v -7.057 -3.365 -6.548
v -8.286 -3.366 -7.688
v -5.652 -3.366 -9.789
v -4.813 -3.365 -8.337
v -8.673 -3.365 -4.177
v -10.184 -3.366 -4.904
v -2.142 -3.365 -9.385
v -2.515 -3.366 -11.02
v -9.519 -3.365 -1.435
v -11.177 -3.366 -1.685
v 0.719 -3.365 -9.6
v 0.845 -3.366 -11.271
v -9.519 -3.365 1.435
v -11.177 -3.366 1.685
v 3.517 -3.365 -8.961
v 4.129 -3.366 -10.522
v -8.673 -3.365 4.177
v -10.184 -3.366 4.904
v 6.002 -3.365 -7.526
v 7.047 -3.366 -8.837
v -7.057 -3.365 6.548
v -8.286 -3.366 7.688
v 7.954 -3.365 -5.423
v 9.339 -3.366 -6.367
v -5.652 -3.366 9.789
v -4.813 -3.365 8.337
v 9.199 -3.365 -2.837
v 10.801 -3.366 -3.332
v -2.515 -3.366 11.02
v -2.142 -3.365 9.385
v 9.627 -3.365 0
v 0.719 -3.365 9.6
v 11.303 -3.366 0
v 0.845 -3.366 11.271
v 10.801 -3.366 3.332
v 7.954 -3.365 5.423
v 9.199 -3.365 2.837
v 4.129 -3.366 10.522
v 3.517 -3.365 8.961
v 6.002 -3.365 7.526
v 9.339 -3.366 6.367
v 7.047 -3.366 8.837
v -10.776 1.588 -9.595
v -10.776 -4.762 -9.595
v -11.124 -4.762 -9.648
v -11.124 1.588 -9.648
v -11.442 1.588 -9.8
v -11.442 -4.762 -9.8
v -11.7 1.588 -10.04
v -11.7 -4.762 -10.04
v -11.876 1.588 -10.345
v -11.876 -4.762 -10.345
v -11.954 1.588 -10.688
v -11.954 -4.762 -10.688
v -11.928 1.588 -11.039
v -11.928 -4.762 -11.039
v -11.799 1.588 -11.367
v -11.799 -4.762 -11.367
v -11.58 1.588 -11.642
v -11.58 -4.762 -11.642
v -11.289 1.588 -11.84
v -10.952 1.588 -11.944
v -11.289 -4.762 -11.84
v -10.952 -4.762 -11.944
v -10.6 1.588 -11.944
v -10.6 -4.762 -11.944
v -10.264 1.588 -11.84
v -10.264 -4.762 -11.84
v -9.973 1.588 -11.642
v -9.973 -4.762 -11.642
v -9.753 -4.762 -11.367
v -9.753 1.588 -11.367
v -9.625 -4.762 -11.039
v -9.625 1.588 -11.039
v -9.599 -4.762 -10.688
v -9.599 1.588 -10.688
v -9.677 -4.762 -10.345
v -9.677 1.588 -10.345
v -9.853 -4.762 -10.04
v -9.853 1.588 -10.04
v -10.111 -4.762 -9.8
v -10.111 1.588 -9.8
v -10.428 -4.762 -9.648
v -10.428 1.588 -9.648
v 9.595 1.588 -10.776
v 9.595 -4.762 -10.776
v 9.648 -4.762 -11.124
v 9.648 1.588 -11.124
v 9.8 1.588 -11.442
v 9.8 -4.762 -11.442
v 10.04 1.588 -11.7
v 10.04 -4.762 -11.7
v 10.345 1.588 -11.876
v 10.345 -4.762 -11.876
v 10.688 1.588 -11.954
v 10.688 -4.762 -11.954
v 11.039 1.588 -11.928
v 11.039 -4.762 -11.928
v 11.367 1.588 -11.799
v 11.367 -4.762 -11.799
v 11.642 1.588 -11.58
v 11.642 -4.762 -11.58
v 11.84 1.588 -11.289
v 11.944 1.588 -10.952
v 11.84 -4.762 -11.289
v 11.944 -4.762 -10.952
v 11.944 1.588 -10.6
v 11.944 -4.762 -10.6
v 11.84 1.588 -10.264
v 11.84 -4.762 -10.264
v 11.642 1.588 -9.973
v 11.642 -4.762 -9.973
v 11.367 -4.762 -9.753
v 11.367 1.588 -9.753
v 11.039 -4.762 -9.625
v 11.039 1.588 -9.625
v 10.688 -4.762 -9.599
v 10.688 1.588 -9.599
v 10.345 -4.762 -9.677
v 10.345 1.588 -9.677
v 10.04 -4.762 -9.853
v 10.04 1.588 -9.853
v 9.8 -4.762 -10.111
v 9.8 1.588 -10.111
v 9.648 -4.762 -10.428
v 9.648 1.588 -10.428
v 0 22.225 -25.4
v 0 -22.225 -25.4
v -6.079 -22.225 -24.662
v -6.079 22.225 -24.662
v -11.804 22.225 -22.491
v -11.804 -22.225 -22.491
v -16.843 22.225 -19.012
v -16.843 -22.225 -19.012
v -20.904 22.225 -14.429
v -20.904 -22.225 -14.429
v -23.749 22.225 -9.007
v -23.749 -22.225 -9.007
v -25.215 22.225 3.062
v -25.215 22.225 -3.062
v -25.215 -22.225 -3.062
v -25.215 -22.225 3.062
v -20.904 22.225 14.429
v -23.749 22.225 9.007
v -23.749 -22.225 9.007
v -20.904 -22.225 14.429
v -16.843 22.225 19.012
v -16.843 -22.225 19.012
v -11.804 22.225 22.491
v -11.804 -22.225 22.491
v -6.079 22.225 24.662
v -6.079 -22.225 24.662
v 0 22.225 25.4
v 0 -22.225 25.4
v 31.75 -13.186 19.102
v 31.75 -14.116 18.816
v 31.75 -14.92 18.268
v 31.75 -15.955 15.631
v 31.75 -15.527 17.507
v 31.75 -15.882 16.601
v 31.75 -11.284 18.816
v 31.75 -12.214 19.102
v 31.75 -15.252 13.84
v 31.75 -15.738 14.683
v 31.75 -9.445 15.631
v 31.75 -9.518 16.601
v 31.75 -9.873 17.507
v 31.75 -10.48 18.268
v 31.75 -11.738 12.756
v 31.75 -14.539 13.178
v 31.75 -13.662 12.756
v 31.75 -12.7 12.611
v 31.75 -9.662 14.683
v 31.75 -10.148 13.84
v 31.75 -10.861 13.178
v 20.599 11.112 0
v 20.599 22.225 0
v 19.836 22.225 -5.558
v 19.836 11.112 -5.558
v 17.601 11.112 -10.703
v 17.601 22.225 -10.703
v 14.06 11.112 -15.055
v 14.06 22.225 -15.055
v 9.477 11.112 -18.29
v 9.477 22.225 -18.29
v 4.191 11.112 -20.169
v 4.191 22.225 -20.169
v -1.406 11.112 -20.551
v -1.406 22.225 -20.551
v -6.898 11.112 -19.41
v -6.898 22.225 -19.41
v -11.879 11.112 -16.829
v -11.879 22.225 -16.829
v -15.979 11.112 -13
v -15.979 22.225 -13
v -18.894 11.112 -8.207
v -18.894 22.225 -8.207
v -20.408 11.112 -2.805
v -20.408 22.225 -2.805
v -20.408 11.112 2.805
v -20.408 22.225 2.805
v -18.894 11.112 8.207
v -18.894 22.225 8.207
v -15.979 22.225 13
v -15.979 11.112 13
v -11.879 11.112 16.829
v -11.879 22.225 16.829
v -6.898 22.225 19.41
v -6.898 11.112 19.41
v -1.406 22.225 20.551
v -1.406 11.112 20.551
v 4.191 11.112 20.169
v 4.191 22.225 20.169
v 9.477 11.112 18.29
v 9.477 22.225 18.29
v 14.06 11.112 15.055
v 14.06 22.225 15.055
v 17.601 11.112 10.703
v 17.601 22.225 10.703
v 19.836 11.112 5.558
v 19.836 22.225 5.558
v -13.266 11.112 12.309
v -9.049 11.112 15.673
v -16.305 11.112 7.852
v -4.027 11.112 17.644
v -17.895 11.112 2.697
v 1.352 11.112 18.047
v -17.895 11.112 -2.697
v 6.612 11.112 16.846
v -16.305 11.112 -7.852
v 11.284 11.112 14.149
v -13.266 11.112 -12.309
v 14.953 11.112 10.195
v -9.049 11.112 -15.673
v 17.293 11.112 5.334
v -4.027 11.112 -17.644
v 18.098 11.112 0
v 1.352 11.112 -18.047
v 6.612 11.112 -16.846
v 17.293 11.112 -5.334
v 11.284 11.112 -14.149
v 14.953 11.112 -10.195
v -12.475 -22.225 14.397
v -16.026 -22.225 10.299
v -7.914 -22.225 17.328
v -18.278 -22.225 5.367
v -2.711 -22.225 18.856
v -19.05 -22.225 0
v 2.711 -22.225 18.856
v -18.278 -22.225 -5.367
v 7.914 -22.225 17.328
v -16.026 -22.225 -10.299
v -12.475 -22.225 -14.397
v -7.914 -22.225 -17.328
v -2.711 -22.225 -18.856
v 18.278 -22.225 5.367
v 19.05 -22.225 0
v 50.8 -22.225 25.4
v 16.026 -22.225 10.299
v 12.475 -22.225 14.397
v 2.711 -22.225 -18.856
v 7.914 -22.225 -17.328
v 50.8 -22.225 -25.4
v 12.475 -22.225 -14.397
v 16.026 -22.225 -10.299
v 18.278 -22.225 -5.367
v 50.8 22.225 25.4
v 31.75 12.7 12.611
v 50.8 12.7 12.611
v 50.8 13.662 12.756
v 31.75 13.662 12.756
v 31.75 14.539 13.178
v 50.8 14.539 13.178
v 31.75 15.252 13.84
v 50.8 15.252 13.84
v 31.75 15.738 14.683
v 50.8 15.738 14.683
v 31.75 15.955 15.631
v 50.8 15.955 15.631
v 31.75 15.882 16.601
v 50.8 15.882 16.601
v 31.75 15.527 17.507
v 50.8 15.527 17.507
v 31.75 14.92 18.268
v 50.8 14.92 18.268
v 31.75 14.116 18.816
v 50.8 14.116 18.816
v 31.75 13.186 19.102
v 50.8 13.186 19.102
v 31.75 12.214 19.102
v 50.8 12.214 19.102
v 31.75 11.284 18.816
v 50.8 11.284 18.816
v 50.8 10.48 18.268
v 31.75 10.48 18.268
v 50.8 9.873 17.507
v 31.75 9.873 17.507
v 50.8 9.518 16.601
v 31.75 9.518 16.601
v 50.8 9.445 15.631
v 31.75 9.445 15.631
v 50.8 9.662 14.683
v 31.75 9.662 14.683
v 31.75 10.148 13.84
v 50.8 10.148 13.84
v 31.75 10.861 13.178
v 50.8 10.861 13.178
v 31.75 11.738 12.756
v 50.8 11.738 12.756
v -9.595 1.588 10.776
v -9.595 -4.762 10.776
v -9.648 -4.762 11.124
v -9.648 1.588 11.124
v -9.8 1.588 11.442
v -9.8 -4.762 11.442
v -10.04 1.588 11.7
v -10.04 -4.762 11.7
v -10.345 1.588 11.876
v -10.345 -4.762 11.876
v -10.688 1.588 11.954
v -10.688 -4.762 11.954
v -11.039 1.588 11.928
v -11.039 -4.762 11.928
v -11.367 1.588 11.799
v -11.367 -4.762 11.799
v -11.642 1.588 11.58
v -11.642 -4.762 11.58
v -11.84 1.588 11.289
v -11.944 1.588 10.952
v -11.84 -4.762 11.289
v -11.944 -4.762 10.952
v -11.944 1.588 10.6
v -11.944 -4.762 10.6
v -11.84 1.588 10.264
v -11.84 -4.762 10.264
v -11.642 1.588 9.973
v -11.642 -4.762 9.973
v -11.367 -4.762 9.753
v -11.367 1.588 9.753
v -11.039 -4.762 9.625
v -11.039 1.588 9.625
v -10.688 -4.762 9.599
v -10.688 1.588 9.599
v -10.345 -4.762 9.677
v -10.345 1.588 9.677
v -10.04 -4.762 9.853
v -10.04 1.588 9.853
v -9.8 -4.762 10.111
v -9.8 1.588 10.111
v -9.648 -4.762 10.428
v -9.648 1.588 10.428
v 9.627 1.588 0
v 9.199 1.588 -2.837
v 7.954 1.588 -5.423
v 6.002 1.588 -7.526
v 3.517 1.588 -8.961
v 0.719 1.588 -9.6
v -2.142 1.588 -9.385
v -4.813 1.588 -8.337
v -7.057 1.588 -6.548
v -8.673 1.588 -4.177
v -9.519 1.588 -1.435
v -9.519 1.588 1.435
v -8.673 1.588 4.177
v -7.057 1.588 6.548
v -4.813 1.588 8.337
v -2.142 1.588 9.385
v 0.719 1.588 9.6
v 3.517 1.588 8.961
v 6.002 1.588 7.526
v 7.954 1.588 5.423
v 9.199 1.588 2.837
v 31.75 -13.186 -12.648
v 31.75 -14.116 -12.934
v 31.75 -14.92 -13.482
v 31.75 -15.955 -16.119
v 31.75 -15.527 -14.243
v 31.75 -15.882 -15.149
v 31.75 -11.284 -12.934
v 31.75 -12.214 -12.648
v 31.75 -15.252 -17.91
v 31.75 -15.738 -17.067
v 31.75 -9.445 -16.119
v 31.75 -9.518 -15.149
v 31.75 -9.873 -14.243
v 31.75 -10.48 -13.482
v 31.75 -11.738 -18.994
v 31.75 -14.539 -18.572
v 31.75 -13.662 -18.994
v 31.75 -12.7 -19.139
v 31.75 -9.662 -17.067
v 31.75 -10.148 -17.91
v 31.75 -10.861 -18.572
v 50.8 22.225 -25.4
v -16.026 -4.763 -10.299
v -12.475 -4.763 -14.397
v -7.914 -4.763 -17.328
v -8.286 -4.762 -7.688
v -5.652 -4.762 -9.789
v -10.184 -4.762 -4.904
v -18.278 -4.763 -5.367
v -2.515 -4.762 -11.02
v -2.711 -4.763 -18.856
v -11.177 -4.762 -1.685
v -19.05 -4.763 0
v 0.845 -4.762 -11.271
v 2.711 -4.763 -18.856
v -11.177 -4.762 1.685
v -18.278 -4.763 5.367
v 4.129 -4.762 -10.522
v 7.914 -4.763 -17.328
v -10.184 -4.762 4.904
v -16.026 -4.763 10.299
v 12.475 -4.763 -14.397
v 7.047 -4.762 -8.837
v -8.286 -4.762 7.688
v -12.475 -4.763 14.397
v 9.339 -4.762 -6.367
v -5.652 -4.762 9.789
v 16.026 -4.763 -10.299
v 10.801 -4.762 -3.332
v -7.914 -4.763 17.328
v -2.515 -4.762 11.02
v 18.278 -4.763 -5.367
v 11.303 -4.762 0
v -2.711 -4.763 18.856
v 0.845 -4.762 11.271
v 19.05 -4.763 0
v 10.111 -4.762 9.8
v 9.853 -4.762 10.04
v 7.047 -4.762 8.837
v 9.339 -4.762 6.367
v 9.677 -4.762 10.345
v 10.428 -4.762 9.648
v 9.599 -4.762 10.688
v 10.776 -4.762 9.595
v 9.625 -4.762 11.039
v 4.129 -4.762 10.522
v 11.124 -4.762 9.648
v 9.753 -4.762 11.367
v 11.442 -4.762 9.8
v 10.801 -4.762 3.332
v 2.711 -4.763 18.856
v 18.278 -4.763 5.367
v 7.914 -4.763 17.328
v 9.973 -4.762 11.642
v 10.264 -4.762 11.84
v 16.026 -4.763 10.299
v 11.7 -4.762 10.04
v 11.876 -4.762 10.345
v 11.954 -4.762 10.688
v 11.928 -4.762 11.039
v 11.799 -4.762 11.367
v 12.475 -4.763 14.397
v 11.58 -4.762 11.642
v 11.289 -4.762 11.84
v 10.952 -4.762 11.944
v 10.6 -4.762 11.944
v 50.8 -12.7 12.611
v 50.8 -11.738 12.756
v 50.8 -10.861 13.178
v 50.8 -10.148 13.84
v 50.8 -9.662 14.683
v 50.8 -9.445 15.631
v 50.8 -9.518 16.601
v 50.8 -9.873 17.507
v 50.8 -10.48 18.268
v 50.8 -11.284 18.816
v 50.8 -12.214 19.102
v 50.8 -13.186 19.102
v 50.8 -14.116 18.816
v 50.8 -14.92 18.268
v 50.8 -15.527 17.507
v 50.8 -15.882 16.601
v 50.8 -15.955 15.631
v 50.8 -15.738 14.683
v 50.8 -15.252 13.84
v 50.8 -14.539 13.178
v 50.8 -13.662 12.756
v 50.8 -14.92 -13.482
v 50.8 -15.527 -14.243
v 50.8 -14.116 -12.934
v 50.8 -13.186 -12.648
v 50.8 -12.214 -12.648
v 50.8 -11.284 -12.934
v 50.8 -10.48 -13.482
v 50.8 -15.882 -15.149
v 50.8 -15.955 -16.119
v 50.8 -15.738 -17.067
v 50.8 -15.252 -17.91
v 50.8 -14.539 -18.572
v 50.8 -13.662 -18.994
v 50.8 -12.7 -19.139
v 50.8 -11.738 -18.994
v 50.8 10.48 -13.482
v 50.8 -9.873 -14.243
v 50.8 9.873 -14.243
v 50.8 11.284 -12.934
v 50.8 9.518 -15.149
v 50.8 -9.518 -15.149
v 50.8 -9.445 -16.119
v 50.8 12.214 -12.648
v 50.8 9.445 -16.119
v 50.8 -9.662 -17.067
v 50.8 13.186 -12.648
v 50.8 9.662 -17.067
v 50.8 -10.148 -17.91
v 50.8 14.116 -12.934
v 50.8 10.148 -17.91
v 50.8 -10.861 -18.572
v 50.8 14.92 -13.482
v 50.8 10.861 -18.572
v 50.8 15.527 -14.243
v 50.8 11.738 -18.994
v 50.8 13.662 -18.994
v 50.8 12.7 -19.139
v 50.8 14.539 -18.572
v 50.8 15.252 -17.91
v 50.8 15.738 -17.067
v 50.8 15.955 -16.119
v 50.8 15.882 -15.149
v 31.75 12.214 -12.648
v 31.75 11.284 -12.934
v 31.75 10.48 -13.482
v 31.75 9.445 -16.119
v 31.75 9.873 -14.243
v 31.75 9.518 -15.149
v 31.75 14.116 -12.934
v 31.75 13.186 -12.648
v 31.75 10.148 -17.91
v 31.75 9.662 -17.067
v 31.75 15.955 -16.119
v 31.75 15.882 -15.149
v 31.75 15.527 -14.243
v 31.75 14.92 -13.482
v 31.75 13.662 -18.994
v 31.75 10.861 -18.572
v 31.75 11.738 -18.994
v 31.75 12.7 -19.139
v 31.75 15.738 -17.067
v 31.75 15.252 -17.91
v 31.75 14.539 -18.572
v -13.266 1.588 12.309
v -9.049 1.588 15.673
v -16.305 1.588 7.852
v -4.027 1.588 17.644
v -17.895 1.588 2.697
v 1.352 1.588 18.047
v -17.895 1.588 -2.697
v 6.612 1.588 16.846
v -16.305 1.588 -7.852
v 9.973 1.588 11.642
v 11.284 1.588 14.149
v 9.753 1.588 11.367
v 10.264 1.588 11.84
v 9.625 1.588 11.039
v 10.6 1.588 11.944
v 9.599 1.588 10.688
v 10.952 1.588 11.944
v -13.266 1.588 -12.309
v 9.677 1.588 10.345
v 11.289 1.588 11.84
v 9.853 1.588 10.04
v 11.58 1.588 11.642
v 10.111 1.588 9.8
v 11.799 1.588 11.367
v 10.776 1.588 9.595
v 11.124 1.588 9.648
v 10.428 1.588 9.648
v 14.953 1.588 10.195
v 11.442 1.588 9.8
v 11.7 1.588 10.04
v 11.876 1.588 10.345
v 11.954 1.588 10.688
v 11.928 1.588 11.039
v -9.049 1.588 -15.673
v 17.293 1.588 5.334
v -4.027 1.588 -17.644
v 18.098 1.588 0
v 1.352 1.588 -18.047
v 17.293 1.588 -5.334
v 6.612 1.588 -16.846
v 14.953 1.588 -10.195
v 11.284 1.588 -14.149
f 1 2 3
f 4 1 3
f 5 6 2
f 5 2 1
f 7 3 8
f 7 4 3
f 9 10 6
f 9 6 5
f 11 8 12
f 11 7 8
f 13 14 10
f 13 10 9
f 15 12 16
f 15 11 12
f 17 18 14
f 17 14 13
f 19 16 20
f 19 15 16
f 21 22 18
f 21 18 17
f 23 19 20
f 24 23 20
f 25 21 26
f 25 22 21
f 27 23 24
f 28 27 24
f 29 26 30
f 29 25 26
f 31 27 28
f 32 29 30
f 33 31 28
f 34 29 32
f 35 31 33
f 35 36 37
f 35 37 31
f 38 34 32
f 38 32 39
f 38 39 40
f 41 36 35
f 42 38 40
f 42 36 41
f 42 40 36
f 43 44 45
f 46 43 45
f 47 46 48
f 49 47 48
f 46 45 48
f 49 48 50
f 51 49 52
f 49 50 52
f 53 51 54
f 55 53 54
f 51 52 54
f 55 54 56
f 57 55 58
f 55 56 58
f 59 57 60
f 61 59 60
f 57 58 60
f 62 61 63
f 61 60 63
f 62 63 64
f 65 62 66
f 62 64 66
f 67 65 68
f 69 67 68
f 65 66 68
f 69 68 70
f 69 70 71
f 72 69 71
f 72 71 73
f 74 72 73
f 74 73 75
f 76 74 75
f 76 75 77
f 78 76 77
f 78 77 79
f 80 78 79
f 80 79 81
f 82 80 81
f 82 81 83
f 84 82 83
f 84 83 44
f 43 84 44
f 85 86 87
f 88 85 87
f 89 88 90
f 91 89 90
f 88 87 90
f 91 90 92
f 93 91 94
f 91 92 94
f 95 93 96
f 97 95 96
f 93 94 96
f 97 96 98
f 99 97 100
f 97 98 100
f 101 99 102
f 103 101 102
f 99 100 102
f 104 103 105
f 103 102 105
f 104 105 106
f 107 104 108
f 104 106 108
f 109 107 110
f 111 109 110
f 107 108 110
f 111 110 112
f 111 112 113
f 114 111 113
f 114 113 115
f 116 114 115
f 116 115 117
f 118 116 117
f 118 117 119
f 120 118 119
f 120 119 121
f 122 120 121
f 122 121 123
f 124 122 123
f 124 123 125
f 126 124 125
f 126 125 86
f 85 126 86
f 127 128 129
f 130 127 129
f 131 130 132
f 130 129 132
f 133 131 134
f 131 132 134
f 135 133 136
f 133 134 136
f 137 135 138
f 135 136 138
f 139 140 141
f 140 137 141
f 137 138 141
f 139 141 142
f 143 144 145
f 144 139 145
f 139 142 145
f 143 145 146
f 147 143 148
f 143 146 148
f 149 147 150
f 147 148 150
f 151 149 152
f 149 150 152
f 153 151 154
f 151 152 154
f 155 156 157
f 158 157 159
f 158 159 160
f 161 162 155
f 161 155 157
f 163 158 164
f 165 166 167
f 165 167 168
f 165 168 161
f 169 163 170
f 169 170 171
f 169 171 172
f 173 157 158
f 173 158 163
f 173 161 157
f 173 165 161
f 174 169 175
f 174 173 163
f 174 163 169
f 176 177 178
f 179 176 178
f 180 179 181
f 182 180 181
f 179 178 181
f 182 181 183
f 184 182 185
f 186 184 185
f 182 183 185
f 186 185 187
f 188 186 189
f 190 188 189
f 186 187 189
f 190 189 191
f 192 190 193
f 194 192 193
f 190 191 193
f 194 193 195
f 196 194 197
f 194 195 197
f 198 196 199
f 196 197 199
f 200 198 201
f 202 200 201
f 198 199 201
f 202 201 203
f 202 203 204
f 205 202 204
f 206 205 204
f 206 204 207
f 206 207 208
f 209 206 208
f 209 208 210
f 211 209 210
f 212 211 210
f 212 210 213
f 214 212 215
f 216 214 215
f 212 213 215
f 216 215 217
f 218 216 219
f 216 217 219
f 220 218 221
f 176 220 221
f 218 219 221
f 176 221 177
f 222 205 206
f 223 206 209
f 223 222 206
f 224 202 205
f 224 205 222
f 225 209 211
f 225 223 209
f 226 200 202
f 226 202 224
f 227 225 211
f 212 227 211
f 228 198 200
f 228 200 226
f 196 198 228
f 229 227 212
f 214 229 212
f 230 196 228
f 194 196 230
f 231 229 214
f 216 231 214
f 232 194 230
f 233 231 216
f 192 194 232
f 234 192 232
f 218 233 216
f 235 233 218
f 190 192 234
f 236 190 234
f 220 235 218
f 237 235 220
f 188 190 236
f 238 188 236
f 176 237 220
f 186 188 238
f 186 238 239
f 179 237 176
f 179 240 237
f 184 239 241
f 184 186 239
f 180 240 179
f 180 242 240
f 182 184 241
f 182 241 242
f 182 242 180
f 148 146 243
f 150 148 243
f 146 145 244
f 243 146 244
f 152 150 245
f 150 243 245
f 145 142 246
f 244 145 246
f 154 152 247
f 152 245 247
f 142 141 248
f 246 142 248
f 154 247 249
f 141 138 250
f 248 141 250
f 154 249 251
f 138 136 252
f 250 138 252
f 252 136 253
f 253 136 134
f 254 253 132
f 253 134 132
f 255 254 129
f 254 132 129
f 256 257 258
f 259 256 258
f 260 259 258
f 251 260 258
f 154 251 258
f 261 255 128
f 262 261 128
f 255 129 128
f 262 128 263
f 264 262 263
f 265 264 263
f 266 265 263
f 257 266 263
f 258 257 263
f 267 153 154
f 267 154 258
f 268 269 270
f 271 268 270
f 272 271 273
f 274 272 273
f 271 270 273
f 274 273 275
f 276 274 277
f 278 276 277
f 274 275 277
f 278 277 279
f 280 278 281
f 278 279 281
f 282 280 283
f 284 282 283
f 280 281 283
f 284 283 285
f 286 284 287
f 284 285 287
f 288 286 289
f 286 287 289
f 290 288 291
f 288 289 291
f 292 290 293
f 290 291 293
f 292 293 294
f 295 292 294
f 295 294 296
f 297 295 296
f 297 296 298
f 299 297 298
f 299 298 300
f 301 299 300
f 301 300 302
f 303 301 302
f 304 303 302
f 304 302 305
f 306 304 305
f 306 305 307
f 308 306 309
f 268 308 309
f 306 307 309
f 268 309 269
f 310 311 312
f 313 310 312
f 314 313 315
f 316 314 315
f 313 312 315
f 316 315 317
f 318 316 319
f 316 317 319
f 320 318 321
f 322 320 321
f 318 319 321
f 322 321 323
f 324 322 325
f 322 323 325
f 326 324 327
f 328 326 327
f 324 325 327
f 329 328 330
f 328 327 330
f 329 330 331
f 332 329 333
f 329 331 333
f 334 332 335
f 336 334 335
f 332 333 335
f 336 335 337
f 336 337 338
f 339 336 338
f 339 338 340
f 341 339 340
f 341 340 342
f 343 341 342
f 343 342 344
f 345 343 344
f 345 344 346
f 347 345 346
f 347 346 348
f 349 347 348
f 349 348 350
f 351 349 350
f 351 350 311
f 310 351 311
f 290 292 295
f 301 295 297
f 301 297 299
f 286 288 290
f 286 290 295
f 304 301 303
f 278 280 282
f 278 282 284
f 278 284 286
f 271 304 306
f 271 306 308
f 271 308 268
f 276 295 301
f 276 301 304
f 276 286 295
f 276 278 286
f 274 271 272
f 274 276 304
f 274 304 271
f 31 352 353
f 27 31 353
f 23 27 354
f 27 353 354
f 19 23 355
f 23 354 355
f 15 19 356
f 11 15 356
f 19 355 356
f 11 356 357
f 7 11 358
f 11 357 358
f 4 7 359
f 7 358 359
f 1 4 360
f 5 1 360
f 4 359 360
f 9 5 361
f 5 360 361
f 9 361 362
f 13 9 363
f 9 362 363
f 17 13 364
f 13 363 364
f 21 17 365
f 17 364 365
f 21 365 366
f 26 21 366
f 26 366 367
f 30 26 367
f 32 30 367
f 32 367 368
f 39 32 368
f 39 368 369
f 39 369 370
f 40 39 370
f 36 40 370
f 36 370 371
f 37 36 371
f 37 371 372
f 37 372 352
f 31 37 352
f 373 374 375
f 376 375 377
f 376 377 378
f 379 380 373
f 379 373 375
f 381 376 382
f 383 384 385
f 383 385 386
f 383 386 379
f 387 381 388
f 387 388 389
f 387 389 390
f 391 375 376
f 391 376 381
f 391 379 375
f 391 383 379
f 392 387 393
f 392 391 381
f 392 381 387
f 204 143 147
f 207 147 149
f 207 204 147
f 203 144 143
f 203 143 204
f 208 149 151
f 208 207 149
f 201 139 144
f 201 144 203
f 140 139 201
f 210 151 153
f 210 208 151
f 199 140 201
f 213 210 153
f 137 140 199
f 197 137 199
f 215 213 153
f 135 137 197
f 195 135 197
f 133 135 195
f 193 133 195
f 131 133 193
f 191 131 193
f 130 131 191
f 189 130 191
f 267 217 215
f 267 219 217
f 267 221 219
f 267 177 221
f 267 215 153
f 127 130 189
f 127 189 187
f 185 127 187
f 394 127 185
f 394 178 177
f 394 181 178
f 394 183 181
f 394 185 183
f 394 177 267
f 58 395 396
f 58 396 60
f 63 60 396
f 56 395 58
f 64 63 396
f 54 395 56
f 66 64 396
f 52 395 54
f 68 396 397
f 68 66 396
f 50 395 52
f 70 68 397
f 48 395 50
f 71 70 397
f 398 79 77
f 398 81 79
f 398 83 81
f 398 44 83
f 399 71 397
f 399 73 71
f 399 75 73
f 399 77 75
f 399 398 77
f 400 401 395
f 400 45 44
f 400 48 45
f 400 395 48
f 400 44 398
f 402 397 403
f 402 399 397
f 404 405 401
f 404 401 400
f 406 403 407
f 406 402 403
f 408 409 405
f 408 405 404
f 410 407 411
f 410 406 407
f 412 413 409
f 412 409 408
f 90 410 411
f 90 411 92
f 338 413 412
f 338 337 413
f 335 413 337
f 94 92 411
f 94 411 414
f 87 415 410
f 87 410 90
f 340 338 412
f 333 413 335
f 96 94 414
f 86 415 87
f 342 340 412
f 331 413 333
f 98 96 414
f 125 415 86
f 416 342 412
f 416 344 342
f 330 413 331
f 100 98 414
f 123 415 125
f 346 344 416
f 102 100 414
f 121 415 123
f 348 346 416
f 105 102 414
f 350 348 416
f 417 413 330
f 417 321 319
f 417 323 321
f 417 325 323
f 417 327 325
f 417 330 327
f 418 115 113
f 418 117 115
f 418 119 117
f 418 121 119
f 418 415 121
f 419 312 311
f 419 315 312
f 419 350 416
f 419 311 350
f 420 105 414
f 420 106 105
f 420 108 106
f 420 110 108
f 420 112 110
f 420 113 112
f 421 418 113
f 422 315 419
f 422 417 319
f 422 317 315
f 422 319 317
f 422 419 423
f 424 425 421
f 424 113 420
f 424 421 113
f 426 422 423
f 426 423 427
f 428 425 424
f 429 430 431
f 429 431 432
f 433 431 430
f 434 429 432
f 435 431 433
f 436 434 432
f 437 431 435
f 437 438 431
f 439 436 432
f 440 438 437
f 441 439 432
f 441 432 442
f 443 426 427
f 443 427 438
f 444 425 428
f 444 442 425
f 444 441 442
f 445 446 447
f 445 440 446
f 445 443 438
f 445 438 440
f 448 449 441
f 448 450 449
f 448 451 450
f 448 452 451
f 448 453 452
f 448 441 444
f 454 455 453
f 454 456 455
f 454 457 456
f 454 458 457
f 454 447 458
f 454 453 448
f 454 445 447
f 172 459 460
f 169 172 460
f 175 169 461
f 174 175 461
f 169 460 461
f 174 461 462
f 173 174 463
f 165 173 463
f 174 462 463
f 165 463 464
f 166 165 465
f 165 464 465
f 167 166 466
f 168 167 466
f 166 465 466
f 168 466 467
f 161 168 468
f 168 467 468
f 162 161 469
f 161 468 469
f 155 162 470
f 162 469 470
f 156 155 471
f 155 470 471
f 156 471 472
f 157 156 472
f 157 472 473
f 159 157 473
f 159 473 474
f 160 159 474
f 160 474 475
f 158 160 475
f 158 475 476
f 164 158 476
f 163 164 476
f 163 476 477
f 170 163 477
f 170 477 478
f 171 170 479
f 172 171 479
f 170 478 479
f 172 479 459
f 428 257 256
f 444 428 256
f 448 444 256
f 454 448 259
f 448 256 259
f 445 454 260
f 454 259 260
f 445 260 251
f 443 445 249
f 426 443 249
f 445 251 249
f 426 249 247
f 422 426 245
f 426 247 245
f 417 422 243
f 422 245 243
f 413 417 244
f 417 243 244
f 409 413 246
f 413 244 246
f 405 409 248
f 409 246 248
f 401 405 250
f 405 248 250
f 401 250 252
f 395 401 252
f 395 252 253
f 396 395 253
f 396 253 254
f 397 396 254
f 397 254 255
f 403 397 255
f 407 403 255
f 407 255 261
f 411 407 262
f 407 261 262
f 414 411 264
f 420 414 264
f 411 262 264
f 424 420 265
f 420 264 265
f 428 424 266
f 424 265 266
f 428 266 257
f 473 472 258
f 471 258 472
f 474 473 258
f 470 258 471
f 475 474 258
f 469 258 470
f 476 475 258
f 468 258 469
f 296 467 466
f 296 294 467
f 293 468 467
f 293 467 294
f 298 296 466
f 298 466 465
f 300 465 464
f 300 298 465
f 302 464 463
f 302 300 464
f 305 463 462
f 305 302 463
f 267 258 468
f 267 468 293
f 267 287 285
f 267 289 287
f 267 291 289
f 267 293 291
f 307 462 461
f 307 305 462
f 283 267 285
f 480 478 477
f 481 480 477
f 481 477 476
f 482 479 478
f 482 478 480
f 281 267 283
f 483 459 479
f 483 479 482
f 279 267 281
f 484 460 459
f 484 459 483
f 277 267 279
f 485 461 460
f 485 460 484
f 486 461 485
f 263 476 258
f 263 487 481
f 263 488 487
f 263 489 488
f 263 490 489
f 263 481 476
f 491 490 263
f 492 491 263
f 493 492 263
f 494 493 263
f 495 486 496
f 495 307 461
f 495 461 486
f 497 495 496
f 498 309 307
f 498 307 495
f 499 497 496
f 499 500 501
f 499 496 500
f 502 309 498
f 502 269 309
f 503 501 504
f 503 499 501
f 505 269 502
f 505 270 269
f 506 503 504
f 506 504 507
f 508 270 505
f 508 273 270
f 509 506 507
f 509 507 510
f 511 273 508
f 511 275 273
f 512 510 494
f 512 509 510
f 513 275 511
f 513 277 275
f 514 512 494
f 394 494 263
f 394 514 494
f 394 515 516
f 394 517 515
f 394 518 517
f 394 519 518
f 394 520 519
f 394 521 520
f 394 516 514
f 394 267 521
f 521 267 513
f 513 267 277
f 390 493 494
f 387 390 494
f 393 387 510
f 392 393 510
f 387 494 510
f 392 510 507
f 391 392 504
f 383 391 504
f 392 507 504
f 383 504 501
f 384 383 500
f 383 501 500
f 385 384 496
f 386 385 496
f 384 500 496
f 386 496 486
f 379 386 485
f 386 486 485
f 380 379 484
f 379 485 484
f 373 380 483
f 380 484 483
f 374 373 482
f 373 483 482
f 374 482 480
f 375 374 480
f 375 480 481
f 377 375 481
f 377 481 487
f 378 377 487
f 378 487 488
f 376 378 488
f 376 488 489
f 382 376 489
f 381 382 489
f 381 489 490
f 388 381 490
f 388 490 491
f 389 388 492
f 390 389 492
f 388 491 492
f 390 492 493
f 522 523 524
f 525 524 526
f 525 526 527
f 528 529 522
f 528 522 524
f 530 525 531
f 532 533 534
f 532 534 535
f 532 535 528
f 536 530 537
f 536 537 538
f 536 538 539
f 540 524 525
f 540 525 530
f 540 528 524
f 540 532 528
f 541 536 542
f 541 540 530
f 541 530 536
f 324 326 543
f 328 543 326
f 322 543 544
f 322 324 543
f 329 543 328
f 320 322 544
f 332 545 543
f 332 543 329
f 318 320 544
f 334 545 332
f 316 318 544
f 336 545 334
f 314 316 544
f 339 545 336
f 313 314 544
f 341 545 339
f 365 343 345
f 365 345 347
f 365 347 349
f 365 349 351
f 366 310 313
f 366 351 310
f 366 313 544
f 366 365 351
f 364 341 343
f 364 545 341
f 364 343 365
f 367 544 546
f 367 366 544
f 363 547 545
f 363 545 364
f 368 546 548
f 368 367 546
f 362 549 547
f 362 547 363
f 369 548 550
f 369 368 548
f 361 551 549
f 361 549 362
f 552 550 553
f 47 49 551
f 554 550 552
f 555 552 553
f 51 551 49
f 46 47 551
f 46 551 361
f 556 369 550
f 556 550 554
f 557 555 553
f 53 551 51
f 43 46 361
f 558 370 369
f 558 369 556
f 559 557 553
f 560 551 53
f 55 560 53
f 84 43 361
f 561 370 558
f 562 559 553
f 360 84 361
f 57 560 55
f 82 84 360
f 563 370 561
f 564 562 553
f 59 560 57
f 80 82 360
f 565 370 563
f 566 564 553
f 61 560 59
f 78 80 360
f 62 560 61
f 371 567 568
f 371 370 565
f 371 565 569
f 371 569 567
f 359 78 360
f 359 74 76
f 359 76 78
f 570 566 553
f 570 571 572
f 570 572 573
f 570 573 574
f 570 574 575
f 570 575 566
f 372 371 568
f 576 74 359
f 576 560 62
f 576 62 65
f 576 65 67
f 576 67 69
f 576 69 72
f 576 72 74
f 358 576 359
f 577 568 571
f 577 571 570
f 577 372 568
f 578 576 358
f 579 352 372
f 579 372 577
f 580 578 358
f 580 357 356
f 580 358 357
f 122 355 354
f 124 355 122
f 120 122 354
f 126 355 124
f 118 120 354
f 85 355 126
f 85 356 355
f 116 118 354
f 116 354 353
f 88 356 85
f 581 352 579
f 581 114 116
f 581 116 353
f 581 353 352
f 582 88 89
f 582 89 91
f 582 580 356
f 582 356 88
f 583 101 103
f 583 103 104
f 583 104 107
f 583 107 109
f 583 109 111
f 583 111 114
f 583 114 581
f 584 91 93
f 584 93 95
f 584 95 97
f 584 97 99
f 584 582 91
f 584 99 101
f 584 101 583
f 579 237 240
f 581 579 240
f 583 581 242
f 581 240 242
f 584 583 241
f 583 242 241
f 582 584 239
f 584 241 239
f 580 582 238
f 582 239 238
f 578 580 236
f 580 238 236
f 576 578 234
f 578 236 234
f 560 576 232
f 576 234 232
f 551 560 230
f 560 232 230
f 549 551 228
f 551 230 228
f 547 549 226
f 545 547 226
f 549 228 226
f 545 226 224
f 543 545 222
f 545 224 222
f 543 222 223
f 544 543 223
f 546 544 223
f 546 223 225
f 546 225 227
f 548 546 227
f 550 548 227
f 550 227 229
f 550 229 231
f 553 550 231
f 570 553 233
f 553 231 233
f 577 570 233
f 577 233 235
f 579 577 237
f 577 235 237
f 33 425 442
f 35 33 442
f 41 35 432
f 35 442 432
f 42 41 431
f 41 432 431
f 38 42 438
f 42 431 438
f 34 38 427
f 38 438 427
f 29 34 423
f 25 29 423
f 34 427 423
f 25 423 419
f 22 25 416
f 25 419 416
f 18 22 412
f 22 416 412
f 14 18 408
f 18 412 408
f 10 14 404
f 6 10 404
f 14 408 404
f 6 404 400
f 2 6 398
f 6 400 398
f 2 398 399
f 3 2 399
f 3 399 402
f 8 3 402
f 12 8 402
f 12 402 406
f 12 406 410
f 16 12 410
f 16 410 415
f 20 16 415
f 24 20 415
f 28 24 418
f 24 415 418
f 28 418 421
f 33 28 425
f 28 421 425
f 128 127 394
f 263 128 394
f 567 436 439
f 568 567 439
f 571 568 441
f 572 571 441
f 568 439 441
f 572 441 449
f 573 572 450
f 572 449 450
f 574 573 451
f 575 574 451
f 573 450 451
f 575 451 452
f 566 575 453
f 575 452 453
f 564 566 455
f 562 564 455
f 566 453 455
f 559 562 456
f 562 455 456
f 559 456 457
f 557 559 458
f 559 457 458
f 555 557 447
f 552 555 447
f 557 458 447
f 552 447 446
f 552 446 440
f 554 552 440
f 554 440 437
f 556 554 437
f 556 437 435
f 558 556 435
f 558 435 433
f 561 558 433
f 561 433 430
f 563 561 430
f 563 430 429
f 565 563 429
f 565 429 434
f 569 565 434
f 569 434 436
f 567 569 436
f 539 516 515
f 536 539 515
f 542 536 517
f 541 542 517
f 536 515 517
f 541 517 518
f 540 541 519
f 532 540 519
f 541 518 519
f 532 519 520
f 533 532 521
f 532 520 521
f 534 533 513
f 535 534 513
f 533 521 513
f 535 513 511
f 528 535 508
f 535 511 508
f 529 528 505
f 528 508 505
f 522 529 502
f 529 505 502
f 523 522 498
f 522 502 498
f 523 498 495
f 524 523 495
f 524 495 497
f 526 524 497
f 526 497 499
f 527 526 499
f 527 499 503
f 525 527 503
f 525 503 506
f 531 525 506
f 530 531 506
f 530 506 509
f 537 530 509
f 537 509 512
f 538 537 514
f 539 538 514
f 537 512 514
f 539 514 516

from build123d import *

# Parameters (mm, degrees)
SKETCH1_W           = 76.2
SKETCH1_H           = 50.8
BOSS_EXTRUDE1_DEPTH = 22.225
SKETCH2_R           = 20.5994
CUT_EXTRUDE1_DEPTH  = 11.1125
SKETCH3_R           = 18.0975
CUT_EXTRUDE2_DEPTH  = 9.525
SKETCH4_R           = 9.6266
CUT_EXTRUDE3_DEPTH  = 24.8125
SKETCH5_R           = 19.05
CUT_EXTRUDE4_DEPTH  = 17.4625
SKETCH6_R           = 11.303
CUT_EXTRUDE5_DEPTH  = 1.397
SKETCH7_R           = 3.2639
CUT_EXTRUDE6_DEPTH  = 19.05
SKETCH8_R           = 1.1811
CUT_EXTRUDE7_DEPTH  = 27.9875
CIRPATTERN1_COUNT   = 4
CUT_EXTRUDE8_DEPTH  = 45.45


with BuildPart() as part:
    # Sketch1 → Boss-Extrude1 (new body, symmetric)
    with BuildSketch(Plane(origin=(0, 0, 0), x_dir=(1, 0, 0), z_dir=(0, 1, 0))):
        with Locations((12.7, 0)):
            Rectangle(SKETCH1_W, SKETCH1_H)
    extrude(amount=BOSS_EXTRUDE1_DEPTH, both=True)

    # Sketch2 → Cut-Extrude1 (cut)
    with BuildSketch(Plane(origin=(0, 22.225, 0), x_dir=(1, 0, 0), z_dir=(0, 1, 0))):
        Circle(SKETCH2_R)
    extrude(amount=-CUT_EXTRUDE1_DEPTH, mode=Mode.SUBTRACT)

    # Sketch3 → Cut-Extrude2 (cut)
    with BuildSketch(Plane(origin=(0, 11.1125, 0), x_dir=(1, 0, 0), z_dir=(0, 1, 0))):
        Circle(SKETCH3_R)
    extrude(amount=-CUT_EXTRUDE2_DEPTH, mode=Mode.SUBTRACT)

    # Sketch4 → Cut-Extrude3 (cut, through all)
    with BuildSketch(Plane(origin=(0, 1.5875, 0), x_dir=(1, 0, 0), z_dir=(0, 1, 0))):
        Circle(SKETCH4_R)
    extrude(amount=-CUT_EXTRUDE3_DEPTH, mode=Mode.SUBTRACT)

    # Sketch5 → Cut-Extrude4 (cut)
    with BuildSketch(Plane.XZ.offset(22.225)):
        Circle(SKETCH5_R)
    extrude(amount=-CUT_EXTRUDE4_DEPTH, mode=Mode.SUBTRACT)

    # Sketch6 → Cut-Extrude5 (cut)
    with BuildSketch(Plane.XZ.offset(4.7625)):
        Circle(SKETCH6_R)
    extrude(amount=-CUT_EXTRUDE5_DEPTH, mode=Mode.SUBTRACT)

    # Sketch7 → Cut-Extrude6 (cut)
    with BuildSketch(Plane(origin=(50.8, 0, 0), x_dir=(0, 0, -1), z_dir=(1, 0, 0))):
        with Locations((-15.875, 12.7)):
            Circle(SKETCH7_R)
        with Locations((15.875, 12.7)):
            Circle(SKETCH7_R)
        with Locations((-15.875, -12.7)):
            Circle(SKETCH7_R)
        with Locations((15.875, -12.7)):
            Circle(SKETCH7_R)
    extrude(amount=-CUT_EXTRUDE6_DEPTH, mode=Mode.SUBTRACT)

    # Sketch8 → Cut-Extrude7 (cut, through all)
    with BuildSketch(Plane.XZ.offset(4.7625)):
        with Locations((-10.776307345, 10.776307345)):
            Circle(SKETCH8_R)
    cut_extrude7 = extrude(amount=-CUT_EXTRUDE7_DEPTH, mode=Mode.SUBTRACT)

    # CirPattern1: Cut-Extrude7 ×4 about axis
    cirpattern1_axis = Axis((0, 0, 0), (0, 1, 0))
    for i in range(1, CIRPATTERN1_COUNT):
        add(cut_extrude7.rotate(cirpattern1_axis, i * 360 / CIRPATTERN1_COUNT), mode=Mode.SUBTRACT)

    # Sketch9 → Cut-Extrude8 (cut, through all)
    with BuildSketch(Plane.XZ.offset(22.225)):
        with BuildLine():
            Line((0, 25.4), (0, 38.1))
            Line((0, 38.1), (-38.1, 38.1))
            Line((-38.1, 38.1), (-38.1, -38.1))
            Line((-38.1, -38.1), (0, -38.1))
            Line((0, -38.1), (0, -25.4))
            ThreePointArc((0, -25.4), (-25.4, 0), (0, 25.4))
        make_face()
    extrude(amount=-CUT_EXTRUDE8_DEPTH, mode=Mode.SUBTRACT)


solid = part.part
